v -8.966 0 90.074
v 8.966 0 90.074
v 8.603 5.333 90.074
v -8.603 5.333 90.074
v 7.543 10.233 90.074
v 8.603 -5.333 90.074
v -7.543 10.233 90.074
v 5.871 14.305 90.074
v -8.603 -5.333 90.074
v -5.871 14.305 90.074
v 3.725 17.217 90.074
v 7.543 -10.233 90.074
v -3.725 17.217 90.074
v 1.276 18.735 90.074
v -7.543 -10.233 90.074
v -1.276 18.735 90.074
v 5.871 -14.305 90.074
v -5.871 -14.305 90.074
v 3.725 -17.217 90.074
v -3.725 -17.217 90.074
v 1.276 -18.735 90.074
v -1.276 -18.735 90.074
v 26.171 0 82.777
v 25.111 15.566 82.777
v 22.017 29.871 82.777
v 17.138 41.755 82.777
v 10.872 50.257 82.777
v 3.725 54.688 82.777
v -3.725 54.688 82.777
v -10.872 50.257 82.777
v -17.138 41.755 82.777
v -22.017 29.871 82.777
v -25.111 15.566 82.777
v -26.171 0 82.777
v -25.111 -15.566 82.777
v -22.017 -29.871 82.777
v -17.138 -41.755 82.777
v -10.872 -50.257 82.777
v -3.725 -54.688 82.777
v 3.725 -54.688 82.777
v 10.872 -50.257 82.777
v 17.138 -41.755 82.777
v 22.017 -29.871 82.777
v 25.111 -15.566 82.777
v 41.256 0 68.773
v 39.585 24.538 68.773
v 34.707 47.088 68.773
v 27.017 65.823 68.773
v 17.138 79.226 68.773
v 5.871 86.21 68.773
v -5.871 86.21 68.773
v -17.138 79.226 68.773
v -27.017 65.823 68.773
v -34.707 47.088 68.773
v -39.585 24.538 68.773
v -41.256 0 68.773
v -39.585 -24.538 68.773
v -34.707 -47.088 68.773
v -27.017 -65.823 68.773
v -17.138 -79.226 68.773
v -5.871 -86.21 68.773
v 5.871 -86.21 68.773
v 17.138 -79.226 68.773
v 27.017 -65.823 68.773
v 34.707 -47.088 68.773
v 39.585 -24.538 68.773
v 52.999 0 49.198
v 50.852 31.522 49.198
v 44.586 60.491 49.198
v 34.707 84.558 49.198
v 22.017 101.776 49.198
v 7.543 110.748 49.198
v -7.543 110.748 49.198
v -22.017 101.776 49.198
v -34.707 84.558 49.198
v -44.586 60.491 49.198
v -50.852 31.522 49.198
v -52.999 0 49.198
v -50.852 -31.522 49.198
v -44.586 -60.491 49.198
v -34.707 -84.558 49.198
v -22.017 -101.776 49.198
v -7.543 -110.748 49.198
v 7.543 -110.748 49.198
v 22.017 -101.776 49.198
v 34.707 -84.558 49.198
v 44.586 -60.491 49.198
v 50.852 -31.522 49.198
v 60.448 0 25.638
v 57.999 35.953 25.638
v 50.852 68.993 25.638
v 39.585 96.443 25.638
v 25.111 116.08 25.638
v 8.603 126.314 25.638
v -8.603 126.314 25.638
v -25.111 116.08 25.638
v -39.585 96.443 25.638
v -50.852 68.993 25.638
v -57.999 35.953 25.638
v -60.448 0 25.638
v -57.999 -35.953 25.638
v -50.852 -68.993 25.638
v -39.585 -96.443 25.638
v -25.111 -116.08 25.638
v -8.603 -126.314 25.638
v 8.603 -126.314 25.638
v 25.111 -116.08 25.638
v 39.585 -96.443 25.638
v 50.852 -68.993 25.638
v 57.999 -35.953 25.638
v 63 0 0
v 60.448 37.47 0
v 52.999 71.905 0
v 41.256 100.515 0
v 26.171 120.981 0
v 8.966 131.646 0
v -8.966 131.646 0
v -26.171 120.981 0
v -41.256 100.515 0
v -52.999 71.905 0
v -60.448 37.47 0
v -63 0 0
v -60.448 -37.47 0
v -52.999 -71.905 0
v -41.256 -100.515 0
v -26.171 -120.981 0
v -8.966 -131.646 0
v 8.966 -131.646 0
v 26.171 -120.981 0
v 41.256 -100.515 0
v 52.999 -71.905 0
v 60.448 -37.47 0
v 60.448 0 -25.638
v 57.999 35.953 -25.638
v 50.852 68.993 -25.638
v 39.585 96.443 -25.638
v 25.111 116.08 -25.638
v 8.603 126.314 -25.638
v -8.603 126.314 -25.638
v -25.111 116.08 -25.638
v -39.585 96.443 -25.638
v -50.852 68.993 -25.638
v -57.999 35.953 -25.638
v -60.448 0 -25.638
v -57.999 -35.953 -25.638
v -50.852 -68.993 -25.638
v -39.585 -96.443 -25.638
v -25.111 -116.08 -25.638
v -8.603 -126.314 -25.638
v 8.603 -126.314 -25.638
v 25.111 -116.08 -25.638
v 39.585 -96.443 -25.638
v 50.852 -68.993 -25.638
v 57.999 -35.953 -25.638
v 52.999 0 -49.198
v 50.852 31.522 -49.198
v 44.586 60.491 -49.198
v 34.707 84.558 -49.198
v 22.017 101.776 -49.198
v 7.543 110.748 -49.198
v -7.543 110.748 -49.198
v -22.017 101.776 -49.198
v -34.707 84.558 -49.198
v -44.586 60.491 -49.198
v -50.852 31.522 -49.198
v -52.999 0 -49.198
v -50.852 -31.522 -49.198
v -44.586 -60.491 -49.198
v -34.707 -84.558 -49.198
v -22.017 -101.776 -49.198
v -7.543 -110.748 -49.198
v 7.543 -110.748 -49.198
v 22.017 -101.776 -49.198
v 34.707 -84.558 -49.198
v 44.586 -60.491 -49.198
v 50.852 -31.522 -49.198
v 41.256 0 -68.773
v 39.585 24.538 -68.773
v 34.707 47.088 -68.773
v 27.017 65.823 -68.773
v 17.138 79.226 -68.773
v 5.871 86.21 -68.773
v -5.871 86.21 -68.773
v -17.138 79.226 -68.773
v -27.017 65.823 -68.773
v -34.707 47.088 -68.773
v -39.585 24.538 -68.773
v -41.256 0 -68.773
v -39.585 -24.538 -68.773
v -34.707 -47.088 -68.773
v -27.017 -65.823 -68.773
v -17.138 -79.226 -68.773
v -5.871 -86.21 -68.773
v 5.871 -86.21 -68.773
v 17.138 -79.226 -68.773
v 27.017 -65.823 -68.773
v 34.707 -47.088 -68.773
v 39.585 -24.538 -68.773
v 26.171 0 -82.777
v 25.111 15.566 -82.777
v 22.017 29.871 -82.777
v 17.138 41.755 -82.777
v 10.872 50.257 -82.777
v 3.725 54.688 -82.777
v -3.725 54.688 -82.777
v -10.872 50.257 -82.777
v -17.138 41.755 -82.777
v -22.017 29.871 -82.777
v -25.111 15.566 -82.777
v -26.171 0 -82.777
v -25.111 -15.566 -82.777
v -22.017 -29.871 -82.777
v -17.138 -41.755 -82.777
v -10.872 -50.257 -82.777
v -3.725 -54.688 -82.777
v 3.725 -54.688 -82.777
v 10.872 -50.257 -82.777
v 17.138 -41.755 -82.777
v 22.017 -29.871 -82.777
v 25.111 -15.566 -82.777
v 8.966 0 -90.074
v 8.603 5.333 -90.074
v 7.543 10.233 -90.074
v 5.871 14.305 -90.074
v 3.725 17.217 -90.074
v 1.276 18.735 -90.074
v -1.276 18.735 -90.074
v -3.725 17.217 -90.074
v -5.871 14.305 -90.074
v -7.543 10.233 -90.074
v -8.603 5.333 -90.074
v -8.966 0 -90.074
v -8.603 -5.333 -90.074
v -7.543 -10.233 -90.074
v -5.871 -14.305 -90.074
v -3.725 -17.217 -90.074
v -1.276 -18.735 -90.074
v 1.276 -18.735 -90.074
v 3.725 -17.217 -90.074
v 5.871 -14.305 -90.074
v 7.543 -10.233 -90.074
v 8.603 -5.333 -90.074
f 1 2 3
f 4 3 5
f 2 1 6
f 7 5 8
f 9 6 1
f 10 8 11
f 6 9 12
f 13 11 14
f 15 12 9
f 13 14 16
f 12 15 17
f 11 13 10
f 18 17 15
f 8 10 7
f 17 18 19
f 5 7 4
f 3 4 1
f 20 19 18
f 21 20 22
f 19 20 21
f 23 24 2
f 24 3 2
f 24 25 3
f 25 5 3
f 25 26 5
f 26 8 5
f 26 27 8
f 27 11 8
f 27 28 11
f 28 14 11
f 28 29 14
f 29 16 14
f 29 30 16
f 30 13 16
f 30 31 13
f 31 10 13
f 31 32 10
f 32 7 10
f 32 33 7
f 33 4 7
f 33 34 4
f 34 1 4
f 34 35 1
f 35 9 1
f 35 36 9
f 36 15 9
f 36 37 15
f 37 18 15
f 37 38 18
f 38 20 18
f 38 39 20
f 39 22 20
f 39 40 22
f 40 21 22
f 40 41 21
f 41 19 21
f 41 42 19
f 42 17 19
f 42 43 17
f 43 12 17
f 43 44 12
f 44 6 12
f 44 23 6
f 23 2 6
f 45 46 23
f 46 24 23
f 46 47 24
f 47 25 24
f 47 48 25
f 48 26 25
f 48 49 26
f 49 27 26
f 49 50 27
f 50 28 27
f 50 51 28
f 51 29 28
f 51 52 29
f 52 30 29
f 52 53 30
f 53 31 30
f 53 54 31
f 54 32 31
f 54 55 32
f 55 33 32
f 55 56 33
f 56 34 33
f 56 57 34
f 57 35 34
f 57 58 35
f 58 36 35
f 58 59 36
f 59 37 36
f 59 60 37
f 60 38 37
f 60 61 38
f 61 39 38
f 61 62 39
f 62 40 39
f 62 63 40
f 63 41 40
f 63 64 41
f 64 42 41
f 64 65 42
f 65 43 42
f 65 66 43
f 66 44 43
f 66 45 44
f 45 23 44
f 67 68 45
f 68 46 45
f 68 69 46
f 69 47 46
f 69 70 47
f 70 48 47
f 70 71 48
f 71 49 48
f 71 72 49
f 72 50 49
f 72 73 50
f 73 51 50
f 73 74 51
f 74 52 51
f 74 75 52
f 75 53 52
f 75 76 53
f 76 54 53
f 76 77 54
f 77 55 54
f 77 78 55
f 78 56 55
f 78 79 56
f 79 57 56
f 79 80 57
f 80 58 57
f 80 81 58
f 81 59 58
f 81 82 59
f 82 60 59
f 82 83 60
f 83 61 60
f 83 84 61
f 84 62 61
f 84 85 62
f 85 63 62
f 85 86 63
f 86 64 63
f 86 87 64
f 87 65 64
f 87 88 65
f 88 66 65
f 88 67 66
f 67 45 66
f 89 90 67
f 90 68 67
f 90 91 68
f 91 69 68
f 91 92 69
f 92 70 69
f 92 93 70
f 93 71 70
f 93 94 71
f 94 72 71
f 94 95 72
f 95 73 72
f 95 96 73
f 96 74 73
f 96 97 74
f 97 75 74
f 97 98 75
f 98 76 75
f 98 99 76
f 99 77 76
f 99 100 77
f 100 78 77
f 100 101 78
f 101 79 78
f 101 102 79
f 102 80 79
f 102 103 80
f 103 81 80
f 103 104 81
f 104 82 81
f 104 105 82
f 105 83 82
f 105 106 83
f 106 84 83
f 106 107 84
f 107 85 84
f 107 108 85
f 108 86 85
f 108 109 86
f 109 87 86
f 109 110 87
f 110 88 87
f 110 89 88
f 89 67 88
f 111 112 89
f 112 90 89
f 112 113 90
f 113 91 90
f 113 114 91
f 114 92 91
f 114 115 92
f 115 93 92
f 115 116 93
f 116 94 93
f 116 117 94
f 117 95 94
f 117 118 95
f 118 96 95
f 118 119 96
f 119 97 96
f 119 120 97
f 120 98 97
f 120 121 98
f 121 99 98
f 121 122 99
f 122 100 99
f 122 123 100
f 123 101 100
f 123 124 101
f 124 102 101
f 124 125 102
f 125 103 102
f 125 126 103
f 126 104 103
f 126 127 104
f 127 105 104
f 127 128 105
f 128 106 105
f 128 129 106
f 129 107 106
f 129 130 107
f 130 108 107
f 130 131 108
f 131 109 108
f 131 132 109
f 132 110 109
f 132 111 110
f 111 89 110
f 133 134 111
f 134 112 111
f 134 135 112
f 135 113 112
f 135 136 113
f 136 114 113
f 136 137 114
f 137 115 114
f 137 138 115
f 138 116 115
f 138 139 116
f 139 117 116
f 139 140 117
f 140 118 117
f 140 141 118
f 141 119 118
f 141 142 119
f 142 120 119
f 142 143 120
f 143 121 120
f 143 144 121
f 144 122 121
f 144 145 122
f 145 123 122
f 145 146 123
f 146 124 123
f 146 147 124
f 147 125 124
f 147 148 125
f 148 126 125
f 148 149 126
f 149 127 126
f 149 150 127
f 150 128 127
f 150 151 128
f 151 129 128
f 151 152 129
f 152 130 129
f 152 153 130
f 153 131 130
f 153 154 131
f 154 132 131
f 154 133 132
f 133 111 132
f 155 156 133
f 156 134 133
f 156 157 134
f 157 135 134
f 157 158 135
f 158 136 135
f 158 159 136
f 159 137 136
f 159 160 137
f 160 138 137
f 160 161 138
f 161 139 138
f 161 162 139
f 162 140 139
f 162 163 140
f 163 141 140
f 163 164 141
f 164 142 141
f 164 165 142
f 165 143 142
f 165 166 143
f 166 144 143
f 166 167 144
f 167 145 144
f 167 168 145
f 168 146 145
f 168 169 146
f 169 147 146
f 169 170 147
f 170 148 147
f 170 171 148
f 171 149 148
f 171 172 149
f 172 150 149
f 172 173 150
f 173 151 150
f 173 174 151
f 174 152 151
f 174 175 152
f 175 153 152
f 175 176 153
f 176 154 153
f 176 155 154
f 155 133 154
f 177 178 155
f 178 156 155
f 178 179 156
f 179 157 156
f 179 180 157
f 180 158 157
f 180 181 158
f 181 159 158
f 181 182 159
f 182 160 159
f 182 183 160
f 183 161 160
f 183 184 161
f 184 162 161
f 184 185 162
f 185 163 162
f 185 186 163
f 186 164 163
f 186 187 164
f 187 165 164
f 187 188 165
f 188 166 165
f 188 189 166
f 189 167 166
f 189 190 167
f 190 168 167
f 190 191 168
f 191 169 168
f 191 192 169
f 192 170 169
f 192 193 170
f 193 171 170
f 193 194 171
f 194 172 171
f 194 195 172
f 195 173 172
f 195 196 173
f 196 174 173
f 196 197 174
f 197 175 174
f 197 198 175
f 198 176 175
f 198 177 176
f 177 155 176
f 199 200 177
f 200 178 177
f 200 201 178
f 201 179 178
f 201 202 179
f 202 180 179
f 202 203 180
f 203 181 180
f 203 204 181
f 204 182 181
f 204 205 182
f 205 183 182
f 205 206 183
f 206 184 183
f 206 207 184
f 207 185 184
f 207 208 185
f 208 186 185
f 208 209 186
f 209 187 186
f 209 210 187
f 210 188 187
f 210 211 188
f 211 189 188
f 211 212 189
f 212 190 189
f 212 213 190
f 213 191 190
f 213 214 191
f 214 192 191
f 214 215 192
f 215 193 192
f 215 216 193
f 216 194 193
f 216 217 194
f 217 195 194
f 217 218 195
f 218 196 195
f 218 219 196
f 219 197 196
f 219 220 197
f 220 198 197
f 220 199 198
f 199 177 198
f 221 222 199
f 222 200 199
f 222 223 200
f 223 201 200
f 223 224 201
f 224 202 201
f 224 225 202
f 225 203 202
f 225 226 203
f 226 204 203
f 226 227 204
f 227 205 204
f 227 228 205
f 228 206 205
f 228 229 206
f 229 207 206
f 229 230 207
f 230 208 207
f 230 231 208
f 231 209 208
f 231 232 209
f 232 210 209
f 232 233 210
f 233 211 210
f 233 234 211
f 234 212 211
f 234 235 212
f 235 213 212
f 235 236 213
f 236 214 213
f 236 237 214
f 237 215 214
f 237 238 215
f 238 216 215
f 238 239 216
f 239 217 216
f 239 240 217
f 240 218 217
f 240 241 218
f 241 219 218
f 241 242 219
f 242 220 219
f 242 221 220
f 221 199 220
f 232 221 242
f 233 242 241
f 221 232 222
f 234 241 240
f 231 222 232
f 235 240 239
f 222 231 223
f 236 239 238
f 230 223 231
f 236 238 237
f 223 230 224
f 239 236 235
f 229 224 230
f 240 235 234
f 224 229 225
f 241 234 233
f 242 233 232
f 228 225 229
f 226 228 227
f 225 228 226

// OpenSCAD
// Generated by SolidPython 1.0.1 on 2020-07-29 00:46:49


scale(v = [9, 19, 13]) {
	sphere(r = 7);
}
/***********************************************
*********      SolidPython code:      **********
************************************************
 
# import packages: SolidPython
from solid import *
from solid.utils import *
from itertools import chain, combinations, permutations


class Resize:

    def __init__(self, scad_file):
        self.scad_file = scad_file
        #self.scad_file = import_scad(scad_file)
        # cone/cylinder param:
        self.r1 = 0
        self.r2 = 0
        self.h = 0
        # rectangular prism param:
        self.w = 0
        self.l = 0
        # ellipse param:
        self.r = 0

    # import OpenScad code (file name corresponds to shape)


    # classify shape + parameters
    def assign(self, param1, param2, param3):
        if self.scad_file == 'cone.scad':
            self.r1 = param1
            self.r2 = param2
            self.h = param3
        elif self.scad_file == 'cylinder.scad':
            self.r1 = param1
            self.r2 = param2
            self.h = param3
        elif self.scad_file == 'rectangularPrism.scad':
            self.h = param1
            self.l = param2
            self.w = param3
        else:
            self.r = param1
            self.h = param2

    # resize parameters
    def iterate(self):
        x = range(3, 20, 2)
        i = 1
        if self.scad_file == 'cone.scad':
            tempList = list(permutations(x, 2))
            for temp in tempList:
                param1 = temp[0]
                param2 = temp[1]
                filepath = 'produced_scad_files/' + 'cone' + str(param1) + '_' + str(param2) + '_' + '.scad'
                scad_render_to_file(cylinder(h=param1, r1=param2, r2=0), filepath)

        elif self.scad_file == 'cylinder.scad':
            tempList = list(permutations(x, 3))
            for temp in tempList:
                param1 = temp[0]
                param2 = temp[1]
                filepath = 'produced_scad_files/' + 'cylinder' + str(param1) + '_' + str(param2) + '_' + '.scad'
                scad_render_to_file(cylinder(h=param1, r1=param2, r2=param2), filepath)

        elif self.scad_file == 'rectangularPrism.scad':
            tempList = list(permutations(x, 3))
            for temp in tempList:
                param1 = temp[0]
                param2 = temp[1]
                param3 = temp[2]
                filepath = 'produced_scad_files/' + 'rectangularPrism' + str(param1) + '_' + str(param2) + '_' + str(
                    param3) + '.scad'
                scad_render_to_file(cube(size=(param1, param2, param3)), filepath)

        elif self.scad_file == 'ellipse.scad':
            tempList = list(permutations(x, 4))
            for temp in tempList:
                param1 = temp[0]
                param2 = temp[1]
                param3 = temp[2]
                param4 = temp[3]
                filepath = 'produced_scad_files/' + 'ellipse' + str(param1) + '_' + str(param2) + '_' + str(param3) + '_' + str(param4) + '.scad'
                scad_render_to_file(scale([param1, param2, param3])(sphere(r=param4)), filepath)

    def render_to_scadfile(self):
        scad_render_to_file(scad, 'example.scad') 
 
************************************************/
